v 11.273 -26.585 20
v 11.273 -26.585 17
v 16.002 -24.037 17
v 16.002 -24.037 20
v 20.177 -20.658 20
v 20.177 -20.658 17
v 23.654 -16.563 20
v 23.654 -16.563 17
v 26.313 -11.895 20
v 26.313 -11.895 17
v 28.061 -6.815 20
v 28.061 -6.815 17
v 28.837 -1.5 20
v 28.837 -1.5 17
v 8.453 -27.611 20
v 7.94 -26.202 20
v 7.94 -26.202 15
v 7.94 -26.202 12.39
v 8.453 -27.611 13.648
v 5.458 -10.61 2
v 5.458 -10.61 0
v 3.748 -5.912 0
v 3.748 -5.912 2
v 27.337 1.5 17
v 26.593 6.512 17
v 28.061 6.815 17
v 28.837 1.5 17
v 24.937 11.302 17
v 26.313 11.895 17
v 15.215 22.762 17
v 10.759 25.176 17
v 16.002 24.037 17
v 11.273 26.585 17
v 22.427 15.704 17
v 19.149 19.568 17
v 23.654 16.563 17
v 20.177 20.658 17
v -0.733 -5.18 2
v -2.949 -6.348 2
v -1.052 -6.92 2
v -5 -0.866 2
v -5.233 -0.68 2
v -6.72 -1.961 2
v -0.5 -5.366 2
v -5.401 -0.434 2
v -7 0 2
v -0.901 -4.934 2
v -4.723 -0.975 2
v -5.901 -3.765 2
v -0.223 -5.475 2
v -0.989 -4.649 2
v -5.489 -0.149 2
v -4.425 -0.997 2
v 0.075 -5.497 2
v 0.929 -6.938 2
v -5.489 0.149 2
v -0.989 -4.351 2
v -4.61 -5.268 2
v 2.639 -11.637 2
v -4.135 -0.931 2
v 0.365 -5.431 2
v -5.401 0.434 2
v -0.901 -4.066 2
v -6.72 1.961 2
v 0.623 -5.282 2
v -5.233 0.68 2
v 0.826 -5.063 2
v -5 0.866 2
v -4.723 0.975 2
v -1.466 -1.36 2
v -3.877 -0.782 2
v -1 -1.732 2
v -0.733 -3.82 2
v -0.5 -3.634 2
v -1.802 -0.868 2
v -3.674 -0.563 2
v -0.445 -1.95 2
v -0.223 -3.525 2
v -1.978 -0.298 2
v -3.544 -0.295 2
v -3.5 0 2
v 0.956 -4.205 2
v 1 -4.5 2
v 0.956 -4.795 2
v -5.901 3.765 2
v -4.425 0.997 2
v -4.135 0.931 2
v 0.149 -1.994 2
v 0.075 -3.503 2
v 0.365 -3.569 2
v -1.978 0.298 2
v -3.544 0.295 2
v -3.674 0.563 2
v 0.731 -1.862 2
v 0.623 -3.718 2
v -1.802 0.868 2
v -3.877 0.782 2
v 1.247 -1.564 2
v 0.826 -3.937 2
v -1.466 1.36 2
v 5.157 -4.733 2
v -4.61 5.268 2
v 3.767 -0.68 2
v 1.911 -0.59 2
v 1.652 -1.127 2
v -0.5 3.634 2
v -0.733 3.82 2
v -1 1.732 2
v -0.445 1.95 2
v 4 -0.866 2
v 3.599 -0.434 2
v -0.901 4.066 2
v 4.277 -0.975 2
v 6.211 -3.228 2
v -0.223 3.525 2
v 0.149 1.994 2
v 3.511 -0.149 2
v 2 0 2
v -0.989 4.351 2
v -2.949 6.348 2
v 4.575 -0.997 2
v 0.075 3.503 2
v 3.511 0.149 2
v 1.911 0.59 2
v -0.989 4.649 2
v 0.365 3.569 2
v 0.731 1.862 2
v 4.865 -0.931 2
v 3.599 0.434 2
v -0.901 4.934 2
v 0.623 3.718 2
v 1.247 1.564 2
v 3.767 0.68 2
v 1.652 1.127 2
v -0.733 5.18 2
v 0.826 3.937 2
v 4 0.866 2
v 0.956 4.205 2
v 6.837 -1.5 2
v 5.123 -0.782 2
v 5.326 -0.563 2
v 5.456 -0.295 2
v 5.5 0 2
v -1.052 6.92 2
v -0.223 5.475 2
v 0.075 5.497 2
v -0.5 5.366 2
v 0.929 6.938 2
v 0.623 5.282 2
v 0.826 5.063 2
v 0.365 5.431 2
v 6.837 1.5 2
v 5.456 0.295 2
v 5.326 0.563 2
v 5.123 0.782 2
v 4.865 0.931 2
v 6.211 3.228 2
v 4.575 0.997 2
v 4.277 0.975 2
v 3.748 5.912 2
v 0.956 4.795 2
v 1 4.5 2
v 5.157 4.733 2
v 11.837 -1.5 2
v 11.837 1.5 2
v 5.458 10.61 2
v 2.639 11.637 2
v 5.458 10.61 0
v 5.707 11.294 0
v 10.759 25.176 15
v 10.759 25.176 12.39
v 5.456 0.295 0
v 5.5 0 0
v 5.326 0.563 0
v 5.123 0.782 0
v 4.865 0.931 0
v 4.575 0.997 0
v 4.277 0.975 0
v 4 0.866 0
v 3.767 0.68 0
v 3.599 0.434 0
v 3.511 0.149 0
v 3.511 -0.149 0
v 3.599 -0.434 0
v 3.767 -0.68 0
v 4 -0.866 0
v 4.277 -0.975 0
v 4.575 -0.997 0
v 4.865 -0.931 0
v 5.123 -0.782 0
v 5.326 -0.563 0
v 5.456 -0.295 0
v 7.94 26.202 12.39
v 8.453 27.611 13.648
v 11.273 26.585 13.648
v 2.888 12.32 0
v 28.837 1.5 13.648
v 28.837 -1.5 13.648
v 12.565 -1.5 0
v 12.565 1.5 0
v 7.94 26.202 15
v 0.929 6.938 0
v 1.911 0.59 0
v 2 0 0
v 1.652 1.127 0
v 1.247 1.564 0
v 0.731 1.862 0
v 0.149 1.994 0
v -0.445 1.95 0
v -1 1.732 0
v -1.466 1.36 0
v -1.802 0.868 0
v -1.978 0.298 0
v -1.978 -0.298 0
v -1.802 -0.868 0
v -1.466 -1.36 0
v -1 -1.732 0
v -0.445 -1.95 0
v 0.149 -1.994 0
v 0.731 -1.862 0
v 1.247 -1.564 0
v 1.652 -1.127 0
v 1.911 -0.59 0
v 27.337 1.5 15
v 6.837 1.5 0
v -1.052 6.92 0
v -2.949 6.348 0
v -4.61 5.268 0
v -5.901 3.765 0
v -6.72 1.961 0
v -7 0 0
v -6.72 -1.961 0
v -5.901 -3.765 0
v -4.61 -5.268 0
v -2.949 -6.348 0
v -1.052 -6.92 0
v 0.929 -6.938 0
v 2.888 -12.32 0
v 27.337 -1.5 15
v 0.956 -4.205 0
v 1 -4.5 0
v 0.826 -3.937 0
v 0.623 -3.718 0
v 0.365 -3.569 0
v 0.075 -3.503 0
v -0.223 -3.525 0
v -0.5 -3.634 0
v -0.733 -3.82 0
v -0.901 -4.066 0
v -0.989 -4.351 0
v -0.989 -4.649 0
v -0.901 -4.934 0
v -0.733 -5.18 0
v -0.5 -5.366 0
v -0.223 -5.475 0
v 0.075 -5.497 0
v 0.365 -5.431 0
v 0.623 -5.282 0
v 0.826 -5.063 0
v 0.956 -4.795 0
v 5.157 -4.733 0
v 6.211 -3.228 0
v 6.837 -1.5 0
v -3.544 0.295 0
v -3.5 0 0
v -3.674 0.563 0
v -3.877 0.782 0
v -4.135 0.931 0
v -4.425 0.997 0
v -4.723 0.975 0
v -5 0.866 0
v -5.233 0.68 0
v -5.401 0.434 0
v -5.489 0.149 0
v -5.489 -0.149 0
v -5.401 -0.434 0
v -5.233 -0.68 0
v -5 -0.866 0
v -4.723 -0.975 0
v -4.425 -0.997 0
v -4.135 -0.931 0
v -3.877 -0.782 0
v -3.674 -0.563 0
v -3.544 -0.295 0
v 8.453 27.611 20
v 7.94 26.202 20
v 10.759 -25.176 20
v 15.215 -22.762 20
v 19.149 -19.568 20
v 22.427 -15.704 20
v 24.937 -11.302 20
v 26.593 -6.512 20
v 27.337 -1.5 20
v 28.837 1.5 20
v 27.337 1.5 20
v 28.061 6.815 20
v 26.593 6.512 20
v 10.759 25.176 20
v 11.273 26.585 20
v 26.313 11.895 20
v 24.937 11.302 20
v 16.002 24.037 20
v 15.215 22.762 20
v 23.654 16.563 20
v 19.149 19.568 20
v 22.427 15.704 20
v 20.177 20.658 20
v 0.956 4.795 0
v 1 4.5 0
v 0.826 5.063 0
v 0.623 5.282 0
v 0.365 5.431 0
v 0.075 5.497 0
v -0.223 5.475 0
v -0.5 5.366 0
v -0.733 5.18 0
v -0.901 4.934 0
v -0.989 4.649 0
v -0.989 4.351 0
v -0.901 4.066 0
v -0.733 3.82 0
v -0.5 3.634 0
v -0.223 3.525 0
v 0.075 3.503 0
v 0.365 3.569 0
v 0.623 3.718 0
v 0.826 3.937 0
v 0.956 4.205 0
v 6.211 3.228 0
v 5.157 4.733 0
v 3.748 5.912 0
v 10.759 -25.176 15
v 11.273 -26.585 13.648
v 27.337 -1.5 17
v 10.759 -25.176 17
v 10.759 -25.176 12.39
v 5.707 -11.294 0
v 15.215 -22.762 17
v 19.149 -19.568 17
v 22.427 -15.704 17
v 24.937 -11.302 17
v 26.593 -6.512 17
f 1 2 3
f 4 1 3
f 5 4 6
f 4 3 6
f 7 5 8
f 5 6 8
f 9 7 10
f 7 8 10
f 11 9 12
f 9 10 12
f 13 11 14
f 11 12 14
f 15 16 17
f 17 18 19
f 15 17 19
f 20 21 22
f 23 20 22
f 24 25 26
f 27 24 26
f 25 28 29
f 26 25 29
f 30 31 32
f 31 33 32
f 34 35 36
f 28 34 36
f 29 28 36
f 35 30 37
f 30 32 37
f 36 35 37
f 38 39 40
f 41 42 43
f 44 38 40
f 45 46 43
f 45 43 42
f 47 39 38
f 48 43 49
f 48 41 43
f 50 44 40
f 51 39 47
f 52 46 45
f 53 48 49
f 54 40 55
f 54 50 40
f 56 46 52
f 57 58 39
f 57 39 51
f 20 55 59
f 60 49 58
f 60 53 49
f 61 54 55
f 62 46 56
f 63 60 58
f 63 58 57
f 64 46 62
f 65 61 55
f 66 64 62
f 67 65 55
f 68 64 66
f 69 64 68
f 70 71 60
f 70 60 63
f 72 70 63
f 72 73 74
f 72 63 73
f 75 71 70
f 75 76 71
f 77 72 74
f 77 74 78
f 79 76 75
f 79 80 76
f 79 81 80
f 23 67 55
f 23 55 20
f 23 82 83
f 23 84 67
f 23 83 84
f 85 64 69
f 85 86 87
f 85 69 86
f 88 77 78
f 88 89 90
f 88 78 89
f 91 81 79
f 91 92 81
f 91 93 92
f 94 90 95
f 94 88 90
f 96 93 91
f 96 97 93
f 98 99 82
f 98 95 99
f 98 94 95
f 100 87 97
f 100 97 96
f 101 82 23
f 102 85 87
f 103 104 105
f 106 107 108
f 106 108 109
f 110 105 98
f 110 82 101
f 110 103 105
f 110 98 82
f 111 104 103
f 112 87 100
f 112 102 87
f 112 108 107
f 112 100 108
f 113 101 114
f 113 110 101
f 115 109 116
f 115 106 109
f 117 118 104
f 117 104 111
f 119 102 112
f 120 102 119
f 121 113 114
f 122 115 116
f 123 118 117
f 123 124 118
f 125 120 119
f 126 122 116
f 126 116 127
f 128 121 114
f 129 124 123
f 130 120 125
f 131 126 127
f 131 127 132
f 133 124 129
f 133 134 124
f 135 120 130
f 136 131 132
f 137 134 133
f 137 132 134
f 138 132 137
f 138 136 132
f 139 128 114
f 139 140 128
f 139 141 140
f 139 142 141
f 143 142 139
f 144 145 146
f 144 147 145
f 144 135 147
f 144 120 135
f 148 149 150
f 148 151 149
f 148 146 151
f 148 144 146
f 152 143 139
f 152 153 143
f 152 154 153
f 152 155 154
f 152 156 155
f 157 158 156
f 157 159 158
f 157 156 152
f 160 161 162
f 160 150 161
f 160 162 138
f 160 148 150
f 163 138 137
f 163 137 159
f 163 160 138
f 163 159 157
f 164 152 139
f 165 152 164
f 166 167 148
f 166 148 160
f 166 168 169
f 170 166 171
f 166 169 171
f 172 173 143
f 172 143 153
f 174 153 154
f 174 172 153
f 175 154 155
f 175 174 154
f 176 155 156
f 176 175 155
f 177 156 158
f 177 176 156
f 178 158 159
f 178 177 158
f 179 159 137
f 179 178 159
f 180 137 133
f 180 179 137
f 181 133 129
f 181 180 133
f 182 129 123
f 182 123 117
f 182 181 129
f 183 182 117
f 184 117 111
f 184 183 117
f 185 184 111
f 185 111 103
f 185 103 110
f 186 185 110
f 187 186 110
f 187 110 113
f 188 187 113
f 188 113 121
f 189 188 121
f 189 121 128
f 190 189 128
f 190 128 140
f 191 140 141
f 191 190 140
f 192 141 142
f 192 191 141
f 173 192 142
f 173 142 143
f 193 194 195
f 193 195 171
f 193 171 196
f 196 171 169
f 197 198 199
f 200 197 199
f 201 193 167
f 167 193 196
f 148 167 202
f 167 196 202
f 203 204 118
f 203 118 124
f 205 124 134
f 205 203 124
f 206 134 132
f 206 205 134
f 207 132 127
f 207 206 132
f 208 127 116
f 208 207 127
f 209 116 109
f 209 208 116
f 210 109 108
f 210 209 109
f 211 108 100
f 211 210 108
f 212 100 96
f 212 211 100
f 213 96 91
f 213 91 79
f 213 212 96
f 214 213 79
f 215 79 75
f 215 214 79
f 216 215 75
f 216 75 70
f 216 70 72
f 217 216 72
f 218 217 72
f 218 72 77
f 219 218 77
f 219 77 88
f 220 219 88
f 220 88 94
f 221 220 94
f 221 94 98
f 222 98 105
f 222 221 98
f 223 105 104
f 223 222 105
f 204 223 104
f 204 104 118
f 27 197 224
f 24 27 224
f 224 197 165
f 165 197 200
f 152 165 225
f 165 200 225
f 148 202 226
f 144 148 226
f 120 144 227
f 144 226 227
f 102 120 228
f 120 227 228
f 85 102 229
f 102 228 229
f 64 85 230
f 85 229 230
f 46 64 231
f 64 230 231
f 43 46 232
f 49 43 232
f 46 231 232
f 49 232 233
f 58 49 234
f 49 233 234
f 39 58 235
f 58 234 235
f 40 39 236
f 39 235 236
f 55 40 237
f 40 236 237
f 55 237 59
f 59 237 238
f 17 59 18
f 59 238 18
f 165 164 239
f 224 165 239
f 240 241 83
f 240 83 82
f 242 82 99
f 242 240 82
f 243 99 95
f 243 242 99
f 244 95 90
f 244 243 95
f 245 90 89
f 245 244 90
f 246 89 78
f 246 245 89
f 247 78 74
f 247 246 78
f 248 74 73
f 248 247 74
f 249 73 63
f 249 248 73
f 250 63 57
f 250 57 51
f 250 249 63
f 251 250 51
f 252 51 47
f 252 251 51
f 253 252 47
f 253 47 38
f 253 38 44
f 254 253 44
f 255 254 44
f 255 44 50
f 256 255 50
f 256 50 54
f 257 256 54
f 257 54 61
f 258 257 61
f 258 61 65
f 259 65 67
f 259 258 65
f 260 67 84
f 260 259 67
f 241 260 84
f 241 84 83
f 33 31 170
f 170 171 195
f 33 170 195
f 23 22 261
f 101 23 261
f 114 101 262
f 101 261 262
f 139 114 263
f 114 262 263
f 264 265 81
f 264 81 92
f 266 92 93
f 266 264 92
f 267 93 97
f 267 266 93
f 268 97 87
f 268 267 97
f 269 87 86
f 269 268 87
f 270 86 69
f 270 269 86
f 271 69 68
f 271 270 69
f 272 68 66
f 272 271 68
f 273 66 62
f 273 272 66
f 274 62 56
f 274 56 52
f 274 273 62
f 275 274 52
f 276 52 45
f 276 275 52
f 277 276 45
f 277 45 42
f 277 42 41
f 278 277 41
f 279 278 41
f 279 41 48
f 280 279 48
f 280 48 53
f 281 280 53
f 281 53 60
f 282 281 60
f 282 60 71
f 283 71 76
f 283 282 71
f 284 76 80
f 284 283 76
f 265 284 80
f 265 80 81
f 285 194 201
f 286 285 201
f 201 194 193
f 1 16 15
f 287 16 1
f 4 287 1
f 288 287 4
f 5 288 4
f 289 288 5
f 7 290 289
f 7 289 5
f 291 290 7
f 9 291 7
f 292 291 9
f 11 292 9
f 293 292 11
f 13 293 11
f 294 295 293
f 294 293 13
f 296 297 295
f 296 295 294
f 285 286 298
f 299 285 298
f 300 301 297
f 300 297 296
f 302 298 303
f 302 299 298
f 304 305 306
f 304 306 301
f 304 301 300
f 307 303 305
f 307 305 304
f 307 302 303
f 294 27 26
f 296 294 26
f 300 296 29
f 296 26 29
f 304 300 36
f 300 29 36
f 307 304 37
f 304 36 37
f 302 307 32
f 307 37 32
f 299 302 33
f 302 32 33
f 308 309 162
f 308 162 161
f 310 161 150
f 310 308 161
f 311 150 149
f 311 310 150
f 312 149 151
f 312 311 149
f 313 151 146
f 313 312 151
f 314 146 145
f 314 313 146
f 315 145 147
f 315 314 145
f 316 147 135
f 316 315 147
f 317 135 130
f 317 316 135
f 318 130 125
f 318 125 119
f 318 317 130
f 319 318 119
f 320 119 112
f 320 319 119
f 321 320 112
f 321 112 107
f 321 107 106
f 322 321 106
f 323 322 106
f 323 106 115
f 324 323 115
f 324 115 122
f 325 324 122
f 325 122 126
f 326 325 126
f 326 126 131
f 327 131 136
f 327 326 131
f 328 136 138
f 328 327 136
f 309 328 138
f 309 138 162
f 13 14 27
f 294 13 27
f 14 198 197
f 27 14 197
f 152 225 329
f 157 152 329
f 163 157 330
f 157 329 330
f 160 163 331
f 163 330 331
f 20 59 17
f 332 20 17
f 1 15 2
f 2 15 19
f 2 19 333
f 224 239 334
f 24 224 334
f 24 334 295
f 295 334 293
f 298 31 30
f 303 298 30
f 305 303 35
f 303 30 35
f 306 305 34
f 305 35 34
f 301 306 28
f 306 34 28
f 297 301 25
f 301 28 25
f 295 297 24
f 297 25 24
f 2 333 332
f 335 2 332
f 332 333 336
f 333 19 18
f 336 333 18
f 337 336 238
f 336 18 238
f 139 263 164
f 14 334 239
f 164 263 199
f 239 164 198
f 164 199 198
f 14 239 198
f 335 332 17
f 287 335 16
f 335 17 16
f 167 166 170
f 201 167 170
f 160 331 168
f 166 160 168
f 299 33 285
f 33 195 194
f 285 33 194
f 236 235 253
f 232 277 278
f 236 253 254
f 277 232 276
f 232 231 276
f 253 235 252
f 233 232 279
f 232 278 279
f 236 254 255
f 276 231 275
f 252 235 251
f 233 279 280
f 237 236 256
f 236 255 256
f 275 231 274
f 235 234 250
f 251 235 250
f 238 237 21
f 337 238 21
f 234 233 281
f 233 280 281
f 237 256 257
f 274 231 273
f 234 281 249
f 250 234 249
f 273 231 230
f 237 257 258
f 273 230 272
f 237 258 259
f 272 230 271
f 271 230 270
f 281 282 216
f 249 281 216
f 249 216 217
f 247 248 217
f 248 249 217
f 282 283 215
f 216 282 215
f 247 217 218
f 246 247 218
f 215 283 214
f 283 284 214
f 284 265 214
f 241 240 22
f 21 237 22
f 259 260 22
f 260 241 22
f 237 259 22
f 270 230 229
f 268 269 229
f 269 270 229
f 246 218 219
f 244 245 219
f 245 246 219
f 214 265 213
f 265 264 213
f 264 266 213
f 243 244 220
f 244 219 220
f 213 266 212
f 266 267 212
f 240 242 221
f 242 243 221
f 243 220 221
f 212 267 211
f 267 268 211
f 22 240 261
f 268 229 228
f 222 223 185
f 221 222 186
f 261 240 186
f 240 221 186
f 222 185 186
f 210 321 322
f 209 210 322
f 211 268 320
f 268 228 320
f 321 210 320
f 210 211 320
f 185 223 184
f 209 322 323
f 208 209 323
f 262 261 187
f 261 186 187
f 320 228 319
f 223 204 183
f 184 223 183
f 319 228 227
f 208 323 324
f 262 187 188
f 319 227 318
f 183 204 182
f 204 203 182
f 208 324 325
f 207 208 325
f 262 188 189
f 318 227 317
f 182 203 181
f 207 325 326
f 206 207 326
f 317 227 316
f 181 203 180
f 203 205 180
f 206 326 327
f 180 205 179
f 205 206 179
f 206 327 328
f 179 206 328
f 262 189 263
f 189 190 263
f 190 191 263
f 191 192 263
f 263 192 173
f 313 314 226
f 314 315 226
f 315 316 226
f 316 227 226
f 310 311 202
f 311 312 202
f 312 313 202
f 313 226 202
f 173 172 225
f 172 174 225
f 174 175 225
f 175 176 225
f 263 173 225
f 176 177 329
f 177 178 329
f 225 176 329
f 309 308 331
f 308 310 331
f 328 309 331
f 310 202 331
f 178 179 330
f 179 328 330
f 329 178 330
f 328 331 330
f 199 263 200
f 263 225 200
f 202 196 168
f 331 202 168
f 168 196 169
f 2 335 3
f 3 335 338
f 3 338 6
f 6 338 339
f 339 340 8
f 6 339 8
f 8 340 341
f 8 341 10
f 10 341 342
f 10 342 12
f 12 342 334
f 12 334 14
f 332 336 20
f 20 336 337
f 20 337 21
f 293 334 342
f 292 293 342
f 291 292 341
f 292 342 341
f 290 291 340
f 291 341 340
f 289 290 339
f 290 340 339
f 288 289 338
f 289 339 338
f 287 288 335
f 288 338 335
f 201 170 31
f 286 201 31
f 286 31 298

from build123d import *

# Parameters (mm, degrees)
F0_R     = 1
F0_R_2   = 2
F1_DEPTH = 2
F2_START = 17
F2_DEPTH = 3
F3_DEPTH = 20
F5_DEPTH = 3
F8_DEPTH = 3
F9_DEPTH = 3


with BuildPart() as f1:
    # F0 (on Top) → F1 (new body)
    with BuildSketch(Plane.XY):
        with BuildLine():
            Line((0.9289886274, 6.9380818769), (3.7480664897, 5.9120214469))
            ThreePointArc((3.7480664897, 5.9120214469), (2.3941410033, 6.5778483455), (0.9289886274, 6.9380818769))
        make_face()
        with BuildLine():
            Line((6.8373971656, -1.5), (6.8373971656, 1.5))
            ThreePointArc((6.8373971656, 1.5), (5.73406431, 4.0150350545), (3.7480664897, 5.9120214469))
            Line((3.7480664897, 5.9120214469), (0.9289886274, 6.9380818769))
            ThreePointArc((0.9289886274, 6.9380818769), (-7, 0), (0.9289886274, -6.9380818769))
            Line((0.9289886274, -6.9380818769), (3.7480664897, -5.9120214469))
            ThreePointArc((3.7480664897, -5.9120214469), (5.73406431, -4.0150350545), (6.8373971656, -1.5))
        make_face()
        with Locations((0, -4.5)):
            Circle(F0_R, mode=Mode.SUBTRACT)
        with Locations((-4.5, 0)):
            Circle(F0_R, mode=Mode.SUBTRACT)
        Circle(F0_R_2, mode=Mode.SUBTRACT)
        with Locations((0, 4.5)):
            Circle(F0_R, mode=Mode.SUBTRACT)
        with Locations((4.5, 0)):
            Circle(F0_R, mode=Mode.SUBTRACT)
        with BuildLine():
            ThreePointArc((6.8373971656, 1.5), (6.9592305666, 0.7543937436), (7, 0))
            ThreePointArc((7, 0), (6.9592305666, -0.7543937436), (6.8373971656, -1.5))
            Line((6.8373971656, -1.5), (11.8373971656, -1.5))
            Line((11.8373971656, -1.5), (11.8373971656, 1.5))
            Line((11.8373971656, 1.5), (6.8373971656, 1.5))
        make_face()
        with BuildLine():
            ThreePointArc((6.8373971656, -1.5), (6.9592305666, -0.7543937436), (7, 0))
            ThreePointArc((7, 0), (6.9592305666, 0.7543937436), (6.8373971656, 1.5))
            Line((6.8373971656, 1.5), (6.8373971656, -1.5))
        make_face()
        with BuildLine():
            ThreePointArc((0.9289886274, -6.9380818769), (2.3941410033, -6.5778483455), (3.7480664897, -5.9120214469))
            Line((3.7480664897, -5.9120214469), (0.9289886274, -6.9380818769))
        make_face()
        with BuildLine():
            Line((5.4581672064, -10.6104845508), (3.7480664897, -5.9120214469))
            ThreePointArc((3.7480664897, -5.9120214469), (2.3941410033, -6.5778483455), (0.9289886274, -6.9380818769))
            Line((0.9289886274, -6.9380818769), (2.639089344, -11.6365449808))
            Line((2.639089344, -11.6365449808), (5.4581672064, -10.6104845508))
        make_face()
        with BuildLine():
            ThreePointArc((0.9289886274, 6.9380818769), (2.3941410033, 6.5778483455), (3.7480664897, 5.9120214469))
            Line((3.7480664897, 5.9120214469), (5.4581672064, 10.6104845508))
            Line((5.4581672064, 10.6104845508), (2.639089344, 11.6365449808))
            Line((2.639089344, 11.6365449808), (0.9289886274, 6.9380818769))
        make_face()
    extrude(amount=F1_DEPTH)



with BuildPart() as f2:
    # F0 (on Top) → F2 (new body)
    with BuildSketch(Plane.XY.offset(F2_START)):
        with BuildLine():
            Line((28.8373971656, -1.5), (27.3373971656, -1.5))
            ThreePointArc((27.3373971656, -1.5), (22.4271695266, -15.7036731632), (10.7594794279, -25.175720173))
            Line((10.7594794279, -25.175720173), (11.2725096429, -26.5852591042))
            ThreePointArc((11.2725096429, -26.5852591042), (23.6541478842, -16.5628126584), (28.8373971656, -1.5))
        make_face()
        with BuildLine():
            Line((11.2725096429, -26.5852591042), (10.7594794279, -25.175720173))
            ThreePointArc((10.7594794279, -25.175720173), (9.3640048747, -25.727391949), (7.9404015655, -26.201780603))
            Line((7.9404015655, -26.201780603), (8.4534317805, -27.6113195342))
            Line((8.4534317805, -27.6113195342), (11.2725096429, -26.5852591042))
        make_face()
        with BuildLine():
            ThreePointArc((10.7594794279, 25.175720173), (22.4271695266, 15.7036731632), (27.3373971656, 1.5))
            Line((27.3373971656, 1.5), (28.8373971656, 1.5))
            ThreePointArc((28.8373971656, 1.5), (23.6541478842, 16.5628126584), (11.2725096429, 26.5852591042))
            Line((11.2725096429, 26.5852591042), (10.7594794279, 25.175720173))
        make_face()
        with BuildLine():
            ThreePointArc((7.9404015655, 26.201780603), (9.3640048747, 25.727391949), (10.7594794279, 25.175720173))
            Line((10.7594794279, 25.175720173), (11.2725096429, 26.5852591042))
            Line((11.2725096429, 26.5852591042), (8.4534317805, 27.6113195342))
            Line((8.4534317805, 27.6113195342), (7.9404015655, 26.201780603))
        make_face()
        with BuildLine():
            Line((28.8373971656, 1.5), (27.3373971656, 1.5))
            ThreePointArc((27.3373971656, 1.5), (27.3785186559, 0), (27.3373971656, -1.5))
            Line((27.3373971656, -1.5), (28.8373971656, -1.5))
            Line((28.8373971656, -1.5), (28.8373971656, 1.5))
        make_face()
    extrude(amount=F2_DEPTH)


with BuildPart() as f1_1:
    add(f1.part)

    add(f2.part)  # F3 merges F2
    # F0 (on Top) → F3 (join)
    with BuildSketch(Plane.XY):
        with BuildLine():
            Line((10.7594794279, -25.175720173), (5.4581672064, -10.6104845508))
            Line((5.4581672064, -10.6104845508), (2.639089344, -11.6365449808))
            Line((2.639089344, -11.6365449808), (7.9404015655, -26.201780603))
            ThreePointArc((7.9404015655, -26.201780603), (9.3640048747, -25.727391949), (10.7594794279, -25.175720173))
        make_face()
        with BuildLine():
            ThreePointArc((7.9404015655, 26.201780603), (9.3640048747, 25.727391949), (10.7594794279, 25.175720173))
            Line((10.7594794279, 25.175720173), (11.2725096429, 26.5852591042))
            Line((11.2725096429, 26.5852591042), (8.4534317805, 27.6113195342))
            Line((8.4534317805, 27.6113195342), (7.9404015655, 26.201780603))
        make_face()
        with BuildLine():
            Line((28.8373971656, 1.5), (27.3373971656, 1.5))
            ThreePointArc((27.3373971656, 1.5), (27.3785186559, 0), (27.3373971656, -1.5))
            Line((27.3373971656, -1.5), (28.8373971656, -1.5))
            Line((28.8373971656, -1.5), (28.8373971656, 1.5))
        make_face()
        with BuildLine():
            Line((11.2725096429, -26.5852591042), (10.7594794279, -25.175720173))
            ThreePointArc((10.7594794279, -25.175720173), (9.3640048747, -25.727391949), (7.9404015655, -26.201780603))
            Line((7.9404015655, -26.201780603), (8.4534317805, -27.6113195342))
            Line((8.4534317805, -27.6113195342), (11.2725096429, -26.5852591042))
        make_face()
        with BuildLine():
            Line((27.3373971656, 1.5), (11.8373971656, 1.5))
            Line((11.8373971656, 1.5), (11.8373971656, -1.5))
            Line((11.8373971656, -1.5), (27.3373971656, -1.5))
            ThreePointArc((27.3373971656, -1.5), (27.3785186559, 0), (27.3373971656, 1.5))
        make_face()
        with BuildLine():
            Line((2.639089344, 11.6365449808), (5.4581672064, 10.6104845508))
            Line((5.4581672064, 10.6104845508), (10.7594794279, 25.175720173))
            ThreePointArc((10.7594794279, 25.175720173), (9.3640048747, 25.727391949), (7.9404015655, 26.201780603))
            Line((7.9404015655, 26.201780603), (2.639089344, 11.6365449808))
        make_face()
    extrude(amount=F3_DEPTH)

    # F4 (on face) → F5 (cut)
    with BuildSketch(Plane(origin=(-1.4095389312, -0.513030215, 0), x_dir=(0.3420201433, -0.9396926208, 0), z_dir=(-0.9396926208, -0.3420201433, 0))):
        Polygon((27.3373971656, 15), (27.3373971656, 20), (11.8373971656, 20), (11.8373971656, 2), align=None)
        Polygon((28.8373971656, 0), (28.8373971656, 13.647751184), (12.5650784462, 0), align=None)
    extrude(amount=-F5_DEPTH, mode=Mode.SUBTRACT)

    # F6 (on face) → F8 (cut)
    with BuildSketch(Plane.XZ.offset(1.5)):
        Polygon((28.8373971656, 0), (28.8373971656, 13.647751184), (12.5650784462, 0), align=None)
        Polygon((27.3373971656, 17), (27.3373971656, 20), (11.8373971656, 20), (11.8373971656, 2), (27.3373971656, 15), align=None)
    extrude(amount=-F8_DEPTH, mode=Mode.SUBTRACT)

    # F7 (on face) → F9 (cut)
    with BuildSketch(Plane(origin=(1.4095389312, -0.513030215, 0), x_dir=(0.3420201433, 0.9396926208, 0), z_dir=(0.9396926208, -0.3420201433, 0))):
        Polygon((27.3373971656, 17), (27.3373971656, 20), (11.8373971656, 20), (11.8373971656, 2), (27.3373971656, 15), align=None)
        Polygon((28.8373971656, 0), (28.8373971656, 13.647751184), (12.5650784462, 0), align=None)
    extrude(amount=-F9_DEPTH, mode=Mode.SUBTRACT)


solid = f1_1.part
